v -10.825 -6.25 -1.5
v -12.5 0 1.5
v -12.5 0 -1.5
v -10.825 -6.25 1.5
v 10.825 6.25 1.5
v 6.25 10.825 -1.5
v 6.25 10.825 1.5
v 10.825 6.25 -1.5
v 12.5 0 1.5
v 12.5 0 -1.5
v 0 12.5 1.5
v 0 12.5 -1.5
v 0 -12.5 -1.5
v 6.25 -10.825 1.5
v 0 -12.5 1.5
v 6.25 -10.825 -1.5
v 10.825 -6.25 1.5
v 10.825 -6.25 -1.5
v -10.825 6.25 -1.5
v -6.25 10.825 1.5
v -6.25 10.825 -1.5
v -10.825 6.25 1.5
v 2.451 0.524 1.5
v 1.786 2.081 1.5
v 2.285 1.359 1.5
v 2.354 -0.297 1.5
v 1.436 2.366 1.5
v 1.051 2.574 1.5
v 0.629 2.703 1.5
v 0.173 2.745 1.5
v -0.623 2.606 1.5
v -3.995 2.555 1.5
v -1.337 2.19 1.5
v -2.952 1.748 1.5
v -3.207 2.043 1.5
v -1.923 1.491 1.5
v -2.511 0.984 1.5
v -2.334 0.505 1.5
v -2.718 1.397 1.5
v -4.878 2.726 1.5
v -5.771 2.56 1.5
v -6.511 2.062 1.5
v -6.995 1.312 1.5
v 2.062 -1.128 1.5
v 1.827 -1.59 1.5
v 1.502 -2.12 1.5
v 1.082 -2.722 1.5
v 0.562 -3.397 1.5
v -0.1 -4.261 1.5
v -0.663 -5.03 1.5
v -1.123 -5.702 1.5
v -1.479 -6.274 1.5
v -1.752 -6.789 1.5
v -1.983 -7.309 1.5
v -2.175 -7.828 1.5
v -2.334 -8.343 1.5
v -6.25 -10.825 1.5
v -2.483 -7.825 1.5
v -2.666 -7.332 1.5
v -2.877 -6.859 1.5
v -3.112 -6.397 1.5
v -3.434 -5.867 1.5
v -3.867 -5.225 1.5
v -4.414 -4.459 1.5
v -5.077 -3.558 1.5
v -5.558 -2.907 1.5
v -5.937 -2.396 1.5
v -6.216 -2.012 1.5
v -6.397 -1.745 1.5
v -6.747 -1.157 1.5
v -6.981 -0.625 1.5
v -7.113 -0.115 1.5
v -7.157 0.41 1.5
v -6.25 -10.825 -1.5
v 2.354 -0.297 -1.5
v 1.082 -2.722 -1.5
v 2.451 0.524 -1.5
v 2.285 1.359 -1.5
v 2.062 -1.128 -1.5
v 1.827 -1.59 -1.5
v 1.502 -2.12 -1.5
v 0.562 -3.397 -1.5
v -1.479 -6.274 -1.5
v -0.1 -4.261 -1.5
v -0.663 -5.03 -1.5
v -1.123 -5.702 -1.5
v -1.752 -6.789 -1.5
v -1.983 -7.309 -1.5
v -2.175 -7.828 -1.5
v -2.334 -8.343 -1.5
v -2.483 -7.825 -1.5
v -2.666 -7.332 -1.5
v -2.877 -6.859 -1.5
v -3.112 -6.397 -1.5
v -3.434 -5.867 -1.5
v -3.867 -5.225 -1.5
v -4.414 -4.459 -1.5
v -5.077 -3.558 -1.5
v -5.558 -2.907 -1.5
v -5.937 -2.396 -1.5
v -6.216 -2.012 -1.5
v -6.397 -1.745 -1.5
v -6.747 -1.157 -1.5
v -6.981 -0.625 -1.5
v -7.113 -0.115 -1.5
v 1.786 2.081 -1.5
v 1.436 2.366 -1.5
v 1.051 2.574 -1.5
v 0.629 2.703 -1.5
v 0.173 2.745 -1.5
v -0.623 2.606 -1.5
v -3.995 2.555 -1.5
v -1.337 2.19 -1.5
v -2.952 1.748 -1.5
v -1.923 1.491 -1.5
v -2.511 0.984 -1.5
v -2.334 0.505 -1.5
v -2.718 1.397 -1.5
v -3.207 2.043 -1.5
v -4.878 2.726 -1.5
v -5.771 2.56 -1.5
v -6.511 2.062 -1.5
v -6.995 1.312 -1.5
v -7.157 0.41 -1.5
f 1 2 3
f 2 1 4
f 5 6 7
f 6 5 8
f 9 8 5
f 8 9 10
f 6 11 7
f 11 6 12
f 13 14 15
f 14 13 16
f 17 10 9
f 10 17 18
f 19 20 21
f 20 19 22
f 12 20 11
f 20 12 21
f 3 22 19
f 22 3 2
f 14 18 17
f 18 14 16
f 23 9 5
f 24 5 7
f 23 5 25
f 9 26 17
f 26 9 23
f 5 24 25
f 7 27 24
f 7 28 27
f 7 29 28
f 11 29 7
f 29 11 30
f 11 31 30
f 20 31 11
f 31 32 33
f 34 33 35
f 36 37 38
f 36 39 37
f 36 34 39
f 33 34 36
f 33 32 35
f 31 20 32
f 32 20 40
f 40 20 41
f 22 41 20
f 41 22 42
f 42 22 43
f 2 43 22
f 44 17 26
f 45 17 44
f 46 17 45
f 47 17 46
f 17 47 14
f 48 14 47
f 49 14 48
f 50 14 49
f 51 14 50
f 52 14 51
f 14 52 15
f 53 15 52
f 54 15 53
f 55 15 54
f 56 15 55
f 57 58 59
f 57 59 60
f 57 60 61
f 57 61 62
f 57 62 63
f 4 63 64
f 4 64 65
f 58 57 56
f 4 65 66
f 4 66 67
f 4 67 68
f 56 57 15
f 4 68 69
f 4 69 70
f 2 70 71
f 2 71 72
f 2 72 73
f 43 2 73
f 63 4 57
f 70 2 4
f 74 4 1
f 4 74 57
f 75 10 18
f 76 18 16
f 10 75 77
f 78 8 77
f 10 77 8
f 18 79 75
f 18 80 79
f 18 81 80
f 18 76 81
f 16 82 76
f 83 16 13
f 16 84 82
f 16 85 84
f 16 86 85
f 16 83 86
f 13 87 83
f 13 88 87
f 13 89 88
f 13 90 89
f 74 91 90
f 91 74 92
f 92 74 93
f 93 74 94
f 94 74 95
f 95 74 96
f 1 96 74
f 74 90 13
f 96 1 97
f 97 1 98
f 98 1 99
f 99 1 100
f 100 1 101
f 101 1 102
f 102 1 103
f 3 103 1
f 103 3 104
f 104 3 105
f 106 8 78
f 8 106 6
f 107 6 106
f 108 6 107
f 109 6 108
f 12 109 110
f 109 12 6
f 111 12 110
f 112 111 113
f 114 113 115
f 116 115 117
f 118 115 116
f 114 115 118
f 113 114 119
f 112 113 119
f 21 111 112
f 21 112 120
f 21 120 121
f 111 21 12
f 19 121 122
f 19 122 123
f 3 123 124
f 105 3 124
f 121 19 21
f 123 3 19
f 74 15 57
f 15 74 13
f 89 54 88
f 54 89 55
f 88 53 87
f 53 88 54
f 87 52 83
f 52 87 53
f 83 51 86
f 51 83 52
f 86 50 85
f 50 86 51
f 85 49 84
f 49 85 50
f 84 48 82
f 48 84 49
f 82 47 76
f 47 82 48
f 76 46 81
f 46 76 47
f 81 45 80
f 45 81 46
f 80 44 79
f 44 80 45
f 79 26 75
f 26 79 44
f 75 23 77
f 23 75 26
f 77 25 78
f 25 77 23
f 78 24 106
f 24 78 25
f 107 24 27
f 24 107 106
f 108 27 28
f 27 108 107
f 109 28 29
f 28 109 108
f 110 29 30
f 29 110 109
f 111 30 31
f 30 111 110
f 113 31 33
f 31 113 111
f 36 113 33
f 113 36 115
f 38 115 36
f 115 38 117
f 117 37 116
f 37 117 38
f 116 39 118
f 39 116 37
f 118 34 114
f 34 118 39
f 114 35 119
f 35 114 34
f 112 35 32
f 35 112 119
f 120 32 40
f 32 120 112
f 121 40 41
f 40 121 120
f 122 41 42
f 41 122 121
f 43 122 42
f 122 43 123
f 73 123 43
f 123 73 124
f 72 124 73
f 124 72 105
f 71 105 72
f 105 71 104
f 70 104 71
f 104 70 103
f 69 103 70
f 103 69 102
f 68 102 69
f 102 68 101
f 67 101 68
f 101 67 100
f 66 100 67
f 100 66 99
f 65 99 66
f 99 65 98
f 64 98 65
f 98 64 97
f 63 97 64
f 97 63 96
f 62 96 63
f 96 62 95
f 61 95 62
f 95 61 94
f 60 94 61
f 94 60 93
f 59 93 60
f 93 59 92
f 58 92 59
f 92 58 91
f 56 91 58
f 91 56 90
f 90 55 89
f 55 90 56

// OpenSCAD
$fn=12;

// unit is mm

diameter = 25;
thickness = 3;
slit_width = 0.8;
arrow_base = 7;

diameter_2 = diameter / 2;


difference() {

  union() {
    cylinder(d=diameter, h=thickness, center=true);
  }

  union() {

    #translate([ -0.65 * diameter_2, -0.65 * diameter_2, -thickness ])
      linear_extrude(2 * thickness)
      text("\u2665", size=14);
  }
}
